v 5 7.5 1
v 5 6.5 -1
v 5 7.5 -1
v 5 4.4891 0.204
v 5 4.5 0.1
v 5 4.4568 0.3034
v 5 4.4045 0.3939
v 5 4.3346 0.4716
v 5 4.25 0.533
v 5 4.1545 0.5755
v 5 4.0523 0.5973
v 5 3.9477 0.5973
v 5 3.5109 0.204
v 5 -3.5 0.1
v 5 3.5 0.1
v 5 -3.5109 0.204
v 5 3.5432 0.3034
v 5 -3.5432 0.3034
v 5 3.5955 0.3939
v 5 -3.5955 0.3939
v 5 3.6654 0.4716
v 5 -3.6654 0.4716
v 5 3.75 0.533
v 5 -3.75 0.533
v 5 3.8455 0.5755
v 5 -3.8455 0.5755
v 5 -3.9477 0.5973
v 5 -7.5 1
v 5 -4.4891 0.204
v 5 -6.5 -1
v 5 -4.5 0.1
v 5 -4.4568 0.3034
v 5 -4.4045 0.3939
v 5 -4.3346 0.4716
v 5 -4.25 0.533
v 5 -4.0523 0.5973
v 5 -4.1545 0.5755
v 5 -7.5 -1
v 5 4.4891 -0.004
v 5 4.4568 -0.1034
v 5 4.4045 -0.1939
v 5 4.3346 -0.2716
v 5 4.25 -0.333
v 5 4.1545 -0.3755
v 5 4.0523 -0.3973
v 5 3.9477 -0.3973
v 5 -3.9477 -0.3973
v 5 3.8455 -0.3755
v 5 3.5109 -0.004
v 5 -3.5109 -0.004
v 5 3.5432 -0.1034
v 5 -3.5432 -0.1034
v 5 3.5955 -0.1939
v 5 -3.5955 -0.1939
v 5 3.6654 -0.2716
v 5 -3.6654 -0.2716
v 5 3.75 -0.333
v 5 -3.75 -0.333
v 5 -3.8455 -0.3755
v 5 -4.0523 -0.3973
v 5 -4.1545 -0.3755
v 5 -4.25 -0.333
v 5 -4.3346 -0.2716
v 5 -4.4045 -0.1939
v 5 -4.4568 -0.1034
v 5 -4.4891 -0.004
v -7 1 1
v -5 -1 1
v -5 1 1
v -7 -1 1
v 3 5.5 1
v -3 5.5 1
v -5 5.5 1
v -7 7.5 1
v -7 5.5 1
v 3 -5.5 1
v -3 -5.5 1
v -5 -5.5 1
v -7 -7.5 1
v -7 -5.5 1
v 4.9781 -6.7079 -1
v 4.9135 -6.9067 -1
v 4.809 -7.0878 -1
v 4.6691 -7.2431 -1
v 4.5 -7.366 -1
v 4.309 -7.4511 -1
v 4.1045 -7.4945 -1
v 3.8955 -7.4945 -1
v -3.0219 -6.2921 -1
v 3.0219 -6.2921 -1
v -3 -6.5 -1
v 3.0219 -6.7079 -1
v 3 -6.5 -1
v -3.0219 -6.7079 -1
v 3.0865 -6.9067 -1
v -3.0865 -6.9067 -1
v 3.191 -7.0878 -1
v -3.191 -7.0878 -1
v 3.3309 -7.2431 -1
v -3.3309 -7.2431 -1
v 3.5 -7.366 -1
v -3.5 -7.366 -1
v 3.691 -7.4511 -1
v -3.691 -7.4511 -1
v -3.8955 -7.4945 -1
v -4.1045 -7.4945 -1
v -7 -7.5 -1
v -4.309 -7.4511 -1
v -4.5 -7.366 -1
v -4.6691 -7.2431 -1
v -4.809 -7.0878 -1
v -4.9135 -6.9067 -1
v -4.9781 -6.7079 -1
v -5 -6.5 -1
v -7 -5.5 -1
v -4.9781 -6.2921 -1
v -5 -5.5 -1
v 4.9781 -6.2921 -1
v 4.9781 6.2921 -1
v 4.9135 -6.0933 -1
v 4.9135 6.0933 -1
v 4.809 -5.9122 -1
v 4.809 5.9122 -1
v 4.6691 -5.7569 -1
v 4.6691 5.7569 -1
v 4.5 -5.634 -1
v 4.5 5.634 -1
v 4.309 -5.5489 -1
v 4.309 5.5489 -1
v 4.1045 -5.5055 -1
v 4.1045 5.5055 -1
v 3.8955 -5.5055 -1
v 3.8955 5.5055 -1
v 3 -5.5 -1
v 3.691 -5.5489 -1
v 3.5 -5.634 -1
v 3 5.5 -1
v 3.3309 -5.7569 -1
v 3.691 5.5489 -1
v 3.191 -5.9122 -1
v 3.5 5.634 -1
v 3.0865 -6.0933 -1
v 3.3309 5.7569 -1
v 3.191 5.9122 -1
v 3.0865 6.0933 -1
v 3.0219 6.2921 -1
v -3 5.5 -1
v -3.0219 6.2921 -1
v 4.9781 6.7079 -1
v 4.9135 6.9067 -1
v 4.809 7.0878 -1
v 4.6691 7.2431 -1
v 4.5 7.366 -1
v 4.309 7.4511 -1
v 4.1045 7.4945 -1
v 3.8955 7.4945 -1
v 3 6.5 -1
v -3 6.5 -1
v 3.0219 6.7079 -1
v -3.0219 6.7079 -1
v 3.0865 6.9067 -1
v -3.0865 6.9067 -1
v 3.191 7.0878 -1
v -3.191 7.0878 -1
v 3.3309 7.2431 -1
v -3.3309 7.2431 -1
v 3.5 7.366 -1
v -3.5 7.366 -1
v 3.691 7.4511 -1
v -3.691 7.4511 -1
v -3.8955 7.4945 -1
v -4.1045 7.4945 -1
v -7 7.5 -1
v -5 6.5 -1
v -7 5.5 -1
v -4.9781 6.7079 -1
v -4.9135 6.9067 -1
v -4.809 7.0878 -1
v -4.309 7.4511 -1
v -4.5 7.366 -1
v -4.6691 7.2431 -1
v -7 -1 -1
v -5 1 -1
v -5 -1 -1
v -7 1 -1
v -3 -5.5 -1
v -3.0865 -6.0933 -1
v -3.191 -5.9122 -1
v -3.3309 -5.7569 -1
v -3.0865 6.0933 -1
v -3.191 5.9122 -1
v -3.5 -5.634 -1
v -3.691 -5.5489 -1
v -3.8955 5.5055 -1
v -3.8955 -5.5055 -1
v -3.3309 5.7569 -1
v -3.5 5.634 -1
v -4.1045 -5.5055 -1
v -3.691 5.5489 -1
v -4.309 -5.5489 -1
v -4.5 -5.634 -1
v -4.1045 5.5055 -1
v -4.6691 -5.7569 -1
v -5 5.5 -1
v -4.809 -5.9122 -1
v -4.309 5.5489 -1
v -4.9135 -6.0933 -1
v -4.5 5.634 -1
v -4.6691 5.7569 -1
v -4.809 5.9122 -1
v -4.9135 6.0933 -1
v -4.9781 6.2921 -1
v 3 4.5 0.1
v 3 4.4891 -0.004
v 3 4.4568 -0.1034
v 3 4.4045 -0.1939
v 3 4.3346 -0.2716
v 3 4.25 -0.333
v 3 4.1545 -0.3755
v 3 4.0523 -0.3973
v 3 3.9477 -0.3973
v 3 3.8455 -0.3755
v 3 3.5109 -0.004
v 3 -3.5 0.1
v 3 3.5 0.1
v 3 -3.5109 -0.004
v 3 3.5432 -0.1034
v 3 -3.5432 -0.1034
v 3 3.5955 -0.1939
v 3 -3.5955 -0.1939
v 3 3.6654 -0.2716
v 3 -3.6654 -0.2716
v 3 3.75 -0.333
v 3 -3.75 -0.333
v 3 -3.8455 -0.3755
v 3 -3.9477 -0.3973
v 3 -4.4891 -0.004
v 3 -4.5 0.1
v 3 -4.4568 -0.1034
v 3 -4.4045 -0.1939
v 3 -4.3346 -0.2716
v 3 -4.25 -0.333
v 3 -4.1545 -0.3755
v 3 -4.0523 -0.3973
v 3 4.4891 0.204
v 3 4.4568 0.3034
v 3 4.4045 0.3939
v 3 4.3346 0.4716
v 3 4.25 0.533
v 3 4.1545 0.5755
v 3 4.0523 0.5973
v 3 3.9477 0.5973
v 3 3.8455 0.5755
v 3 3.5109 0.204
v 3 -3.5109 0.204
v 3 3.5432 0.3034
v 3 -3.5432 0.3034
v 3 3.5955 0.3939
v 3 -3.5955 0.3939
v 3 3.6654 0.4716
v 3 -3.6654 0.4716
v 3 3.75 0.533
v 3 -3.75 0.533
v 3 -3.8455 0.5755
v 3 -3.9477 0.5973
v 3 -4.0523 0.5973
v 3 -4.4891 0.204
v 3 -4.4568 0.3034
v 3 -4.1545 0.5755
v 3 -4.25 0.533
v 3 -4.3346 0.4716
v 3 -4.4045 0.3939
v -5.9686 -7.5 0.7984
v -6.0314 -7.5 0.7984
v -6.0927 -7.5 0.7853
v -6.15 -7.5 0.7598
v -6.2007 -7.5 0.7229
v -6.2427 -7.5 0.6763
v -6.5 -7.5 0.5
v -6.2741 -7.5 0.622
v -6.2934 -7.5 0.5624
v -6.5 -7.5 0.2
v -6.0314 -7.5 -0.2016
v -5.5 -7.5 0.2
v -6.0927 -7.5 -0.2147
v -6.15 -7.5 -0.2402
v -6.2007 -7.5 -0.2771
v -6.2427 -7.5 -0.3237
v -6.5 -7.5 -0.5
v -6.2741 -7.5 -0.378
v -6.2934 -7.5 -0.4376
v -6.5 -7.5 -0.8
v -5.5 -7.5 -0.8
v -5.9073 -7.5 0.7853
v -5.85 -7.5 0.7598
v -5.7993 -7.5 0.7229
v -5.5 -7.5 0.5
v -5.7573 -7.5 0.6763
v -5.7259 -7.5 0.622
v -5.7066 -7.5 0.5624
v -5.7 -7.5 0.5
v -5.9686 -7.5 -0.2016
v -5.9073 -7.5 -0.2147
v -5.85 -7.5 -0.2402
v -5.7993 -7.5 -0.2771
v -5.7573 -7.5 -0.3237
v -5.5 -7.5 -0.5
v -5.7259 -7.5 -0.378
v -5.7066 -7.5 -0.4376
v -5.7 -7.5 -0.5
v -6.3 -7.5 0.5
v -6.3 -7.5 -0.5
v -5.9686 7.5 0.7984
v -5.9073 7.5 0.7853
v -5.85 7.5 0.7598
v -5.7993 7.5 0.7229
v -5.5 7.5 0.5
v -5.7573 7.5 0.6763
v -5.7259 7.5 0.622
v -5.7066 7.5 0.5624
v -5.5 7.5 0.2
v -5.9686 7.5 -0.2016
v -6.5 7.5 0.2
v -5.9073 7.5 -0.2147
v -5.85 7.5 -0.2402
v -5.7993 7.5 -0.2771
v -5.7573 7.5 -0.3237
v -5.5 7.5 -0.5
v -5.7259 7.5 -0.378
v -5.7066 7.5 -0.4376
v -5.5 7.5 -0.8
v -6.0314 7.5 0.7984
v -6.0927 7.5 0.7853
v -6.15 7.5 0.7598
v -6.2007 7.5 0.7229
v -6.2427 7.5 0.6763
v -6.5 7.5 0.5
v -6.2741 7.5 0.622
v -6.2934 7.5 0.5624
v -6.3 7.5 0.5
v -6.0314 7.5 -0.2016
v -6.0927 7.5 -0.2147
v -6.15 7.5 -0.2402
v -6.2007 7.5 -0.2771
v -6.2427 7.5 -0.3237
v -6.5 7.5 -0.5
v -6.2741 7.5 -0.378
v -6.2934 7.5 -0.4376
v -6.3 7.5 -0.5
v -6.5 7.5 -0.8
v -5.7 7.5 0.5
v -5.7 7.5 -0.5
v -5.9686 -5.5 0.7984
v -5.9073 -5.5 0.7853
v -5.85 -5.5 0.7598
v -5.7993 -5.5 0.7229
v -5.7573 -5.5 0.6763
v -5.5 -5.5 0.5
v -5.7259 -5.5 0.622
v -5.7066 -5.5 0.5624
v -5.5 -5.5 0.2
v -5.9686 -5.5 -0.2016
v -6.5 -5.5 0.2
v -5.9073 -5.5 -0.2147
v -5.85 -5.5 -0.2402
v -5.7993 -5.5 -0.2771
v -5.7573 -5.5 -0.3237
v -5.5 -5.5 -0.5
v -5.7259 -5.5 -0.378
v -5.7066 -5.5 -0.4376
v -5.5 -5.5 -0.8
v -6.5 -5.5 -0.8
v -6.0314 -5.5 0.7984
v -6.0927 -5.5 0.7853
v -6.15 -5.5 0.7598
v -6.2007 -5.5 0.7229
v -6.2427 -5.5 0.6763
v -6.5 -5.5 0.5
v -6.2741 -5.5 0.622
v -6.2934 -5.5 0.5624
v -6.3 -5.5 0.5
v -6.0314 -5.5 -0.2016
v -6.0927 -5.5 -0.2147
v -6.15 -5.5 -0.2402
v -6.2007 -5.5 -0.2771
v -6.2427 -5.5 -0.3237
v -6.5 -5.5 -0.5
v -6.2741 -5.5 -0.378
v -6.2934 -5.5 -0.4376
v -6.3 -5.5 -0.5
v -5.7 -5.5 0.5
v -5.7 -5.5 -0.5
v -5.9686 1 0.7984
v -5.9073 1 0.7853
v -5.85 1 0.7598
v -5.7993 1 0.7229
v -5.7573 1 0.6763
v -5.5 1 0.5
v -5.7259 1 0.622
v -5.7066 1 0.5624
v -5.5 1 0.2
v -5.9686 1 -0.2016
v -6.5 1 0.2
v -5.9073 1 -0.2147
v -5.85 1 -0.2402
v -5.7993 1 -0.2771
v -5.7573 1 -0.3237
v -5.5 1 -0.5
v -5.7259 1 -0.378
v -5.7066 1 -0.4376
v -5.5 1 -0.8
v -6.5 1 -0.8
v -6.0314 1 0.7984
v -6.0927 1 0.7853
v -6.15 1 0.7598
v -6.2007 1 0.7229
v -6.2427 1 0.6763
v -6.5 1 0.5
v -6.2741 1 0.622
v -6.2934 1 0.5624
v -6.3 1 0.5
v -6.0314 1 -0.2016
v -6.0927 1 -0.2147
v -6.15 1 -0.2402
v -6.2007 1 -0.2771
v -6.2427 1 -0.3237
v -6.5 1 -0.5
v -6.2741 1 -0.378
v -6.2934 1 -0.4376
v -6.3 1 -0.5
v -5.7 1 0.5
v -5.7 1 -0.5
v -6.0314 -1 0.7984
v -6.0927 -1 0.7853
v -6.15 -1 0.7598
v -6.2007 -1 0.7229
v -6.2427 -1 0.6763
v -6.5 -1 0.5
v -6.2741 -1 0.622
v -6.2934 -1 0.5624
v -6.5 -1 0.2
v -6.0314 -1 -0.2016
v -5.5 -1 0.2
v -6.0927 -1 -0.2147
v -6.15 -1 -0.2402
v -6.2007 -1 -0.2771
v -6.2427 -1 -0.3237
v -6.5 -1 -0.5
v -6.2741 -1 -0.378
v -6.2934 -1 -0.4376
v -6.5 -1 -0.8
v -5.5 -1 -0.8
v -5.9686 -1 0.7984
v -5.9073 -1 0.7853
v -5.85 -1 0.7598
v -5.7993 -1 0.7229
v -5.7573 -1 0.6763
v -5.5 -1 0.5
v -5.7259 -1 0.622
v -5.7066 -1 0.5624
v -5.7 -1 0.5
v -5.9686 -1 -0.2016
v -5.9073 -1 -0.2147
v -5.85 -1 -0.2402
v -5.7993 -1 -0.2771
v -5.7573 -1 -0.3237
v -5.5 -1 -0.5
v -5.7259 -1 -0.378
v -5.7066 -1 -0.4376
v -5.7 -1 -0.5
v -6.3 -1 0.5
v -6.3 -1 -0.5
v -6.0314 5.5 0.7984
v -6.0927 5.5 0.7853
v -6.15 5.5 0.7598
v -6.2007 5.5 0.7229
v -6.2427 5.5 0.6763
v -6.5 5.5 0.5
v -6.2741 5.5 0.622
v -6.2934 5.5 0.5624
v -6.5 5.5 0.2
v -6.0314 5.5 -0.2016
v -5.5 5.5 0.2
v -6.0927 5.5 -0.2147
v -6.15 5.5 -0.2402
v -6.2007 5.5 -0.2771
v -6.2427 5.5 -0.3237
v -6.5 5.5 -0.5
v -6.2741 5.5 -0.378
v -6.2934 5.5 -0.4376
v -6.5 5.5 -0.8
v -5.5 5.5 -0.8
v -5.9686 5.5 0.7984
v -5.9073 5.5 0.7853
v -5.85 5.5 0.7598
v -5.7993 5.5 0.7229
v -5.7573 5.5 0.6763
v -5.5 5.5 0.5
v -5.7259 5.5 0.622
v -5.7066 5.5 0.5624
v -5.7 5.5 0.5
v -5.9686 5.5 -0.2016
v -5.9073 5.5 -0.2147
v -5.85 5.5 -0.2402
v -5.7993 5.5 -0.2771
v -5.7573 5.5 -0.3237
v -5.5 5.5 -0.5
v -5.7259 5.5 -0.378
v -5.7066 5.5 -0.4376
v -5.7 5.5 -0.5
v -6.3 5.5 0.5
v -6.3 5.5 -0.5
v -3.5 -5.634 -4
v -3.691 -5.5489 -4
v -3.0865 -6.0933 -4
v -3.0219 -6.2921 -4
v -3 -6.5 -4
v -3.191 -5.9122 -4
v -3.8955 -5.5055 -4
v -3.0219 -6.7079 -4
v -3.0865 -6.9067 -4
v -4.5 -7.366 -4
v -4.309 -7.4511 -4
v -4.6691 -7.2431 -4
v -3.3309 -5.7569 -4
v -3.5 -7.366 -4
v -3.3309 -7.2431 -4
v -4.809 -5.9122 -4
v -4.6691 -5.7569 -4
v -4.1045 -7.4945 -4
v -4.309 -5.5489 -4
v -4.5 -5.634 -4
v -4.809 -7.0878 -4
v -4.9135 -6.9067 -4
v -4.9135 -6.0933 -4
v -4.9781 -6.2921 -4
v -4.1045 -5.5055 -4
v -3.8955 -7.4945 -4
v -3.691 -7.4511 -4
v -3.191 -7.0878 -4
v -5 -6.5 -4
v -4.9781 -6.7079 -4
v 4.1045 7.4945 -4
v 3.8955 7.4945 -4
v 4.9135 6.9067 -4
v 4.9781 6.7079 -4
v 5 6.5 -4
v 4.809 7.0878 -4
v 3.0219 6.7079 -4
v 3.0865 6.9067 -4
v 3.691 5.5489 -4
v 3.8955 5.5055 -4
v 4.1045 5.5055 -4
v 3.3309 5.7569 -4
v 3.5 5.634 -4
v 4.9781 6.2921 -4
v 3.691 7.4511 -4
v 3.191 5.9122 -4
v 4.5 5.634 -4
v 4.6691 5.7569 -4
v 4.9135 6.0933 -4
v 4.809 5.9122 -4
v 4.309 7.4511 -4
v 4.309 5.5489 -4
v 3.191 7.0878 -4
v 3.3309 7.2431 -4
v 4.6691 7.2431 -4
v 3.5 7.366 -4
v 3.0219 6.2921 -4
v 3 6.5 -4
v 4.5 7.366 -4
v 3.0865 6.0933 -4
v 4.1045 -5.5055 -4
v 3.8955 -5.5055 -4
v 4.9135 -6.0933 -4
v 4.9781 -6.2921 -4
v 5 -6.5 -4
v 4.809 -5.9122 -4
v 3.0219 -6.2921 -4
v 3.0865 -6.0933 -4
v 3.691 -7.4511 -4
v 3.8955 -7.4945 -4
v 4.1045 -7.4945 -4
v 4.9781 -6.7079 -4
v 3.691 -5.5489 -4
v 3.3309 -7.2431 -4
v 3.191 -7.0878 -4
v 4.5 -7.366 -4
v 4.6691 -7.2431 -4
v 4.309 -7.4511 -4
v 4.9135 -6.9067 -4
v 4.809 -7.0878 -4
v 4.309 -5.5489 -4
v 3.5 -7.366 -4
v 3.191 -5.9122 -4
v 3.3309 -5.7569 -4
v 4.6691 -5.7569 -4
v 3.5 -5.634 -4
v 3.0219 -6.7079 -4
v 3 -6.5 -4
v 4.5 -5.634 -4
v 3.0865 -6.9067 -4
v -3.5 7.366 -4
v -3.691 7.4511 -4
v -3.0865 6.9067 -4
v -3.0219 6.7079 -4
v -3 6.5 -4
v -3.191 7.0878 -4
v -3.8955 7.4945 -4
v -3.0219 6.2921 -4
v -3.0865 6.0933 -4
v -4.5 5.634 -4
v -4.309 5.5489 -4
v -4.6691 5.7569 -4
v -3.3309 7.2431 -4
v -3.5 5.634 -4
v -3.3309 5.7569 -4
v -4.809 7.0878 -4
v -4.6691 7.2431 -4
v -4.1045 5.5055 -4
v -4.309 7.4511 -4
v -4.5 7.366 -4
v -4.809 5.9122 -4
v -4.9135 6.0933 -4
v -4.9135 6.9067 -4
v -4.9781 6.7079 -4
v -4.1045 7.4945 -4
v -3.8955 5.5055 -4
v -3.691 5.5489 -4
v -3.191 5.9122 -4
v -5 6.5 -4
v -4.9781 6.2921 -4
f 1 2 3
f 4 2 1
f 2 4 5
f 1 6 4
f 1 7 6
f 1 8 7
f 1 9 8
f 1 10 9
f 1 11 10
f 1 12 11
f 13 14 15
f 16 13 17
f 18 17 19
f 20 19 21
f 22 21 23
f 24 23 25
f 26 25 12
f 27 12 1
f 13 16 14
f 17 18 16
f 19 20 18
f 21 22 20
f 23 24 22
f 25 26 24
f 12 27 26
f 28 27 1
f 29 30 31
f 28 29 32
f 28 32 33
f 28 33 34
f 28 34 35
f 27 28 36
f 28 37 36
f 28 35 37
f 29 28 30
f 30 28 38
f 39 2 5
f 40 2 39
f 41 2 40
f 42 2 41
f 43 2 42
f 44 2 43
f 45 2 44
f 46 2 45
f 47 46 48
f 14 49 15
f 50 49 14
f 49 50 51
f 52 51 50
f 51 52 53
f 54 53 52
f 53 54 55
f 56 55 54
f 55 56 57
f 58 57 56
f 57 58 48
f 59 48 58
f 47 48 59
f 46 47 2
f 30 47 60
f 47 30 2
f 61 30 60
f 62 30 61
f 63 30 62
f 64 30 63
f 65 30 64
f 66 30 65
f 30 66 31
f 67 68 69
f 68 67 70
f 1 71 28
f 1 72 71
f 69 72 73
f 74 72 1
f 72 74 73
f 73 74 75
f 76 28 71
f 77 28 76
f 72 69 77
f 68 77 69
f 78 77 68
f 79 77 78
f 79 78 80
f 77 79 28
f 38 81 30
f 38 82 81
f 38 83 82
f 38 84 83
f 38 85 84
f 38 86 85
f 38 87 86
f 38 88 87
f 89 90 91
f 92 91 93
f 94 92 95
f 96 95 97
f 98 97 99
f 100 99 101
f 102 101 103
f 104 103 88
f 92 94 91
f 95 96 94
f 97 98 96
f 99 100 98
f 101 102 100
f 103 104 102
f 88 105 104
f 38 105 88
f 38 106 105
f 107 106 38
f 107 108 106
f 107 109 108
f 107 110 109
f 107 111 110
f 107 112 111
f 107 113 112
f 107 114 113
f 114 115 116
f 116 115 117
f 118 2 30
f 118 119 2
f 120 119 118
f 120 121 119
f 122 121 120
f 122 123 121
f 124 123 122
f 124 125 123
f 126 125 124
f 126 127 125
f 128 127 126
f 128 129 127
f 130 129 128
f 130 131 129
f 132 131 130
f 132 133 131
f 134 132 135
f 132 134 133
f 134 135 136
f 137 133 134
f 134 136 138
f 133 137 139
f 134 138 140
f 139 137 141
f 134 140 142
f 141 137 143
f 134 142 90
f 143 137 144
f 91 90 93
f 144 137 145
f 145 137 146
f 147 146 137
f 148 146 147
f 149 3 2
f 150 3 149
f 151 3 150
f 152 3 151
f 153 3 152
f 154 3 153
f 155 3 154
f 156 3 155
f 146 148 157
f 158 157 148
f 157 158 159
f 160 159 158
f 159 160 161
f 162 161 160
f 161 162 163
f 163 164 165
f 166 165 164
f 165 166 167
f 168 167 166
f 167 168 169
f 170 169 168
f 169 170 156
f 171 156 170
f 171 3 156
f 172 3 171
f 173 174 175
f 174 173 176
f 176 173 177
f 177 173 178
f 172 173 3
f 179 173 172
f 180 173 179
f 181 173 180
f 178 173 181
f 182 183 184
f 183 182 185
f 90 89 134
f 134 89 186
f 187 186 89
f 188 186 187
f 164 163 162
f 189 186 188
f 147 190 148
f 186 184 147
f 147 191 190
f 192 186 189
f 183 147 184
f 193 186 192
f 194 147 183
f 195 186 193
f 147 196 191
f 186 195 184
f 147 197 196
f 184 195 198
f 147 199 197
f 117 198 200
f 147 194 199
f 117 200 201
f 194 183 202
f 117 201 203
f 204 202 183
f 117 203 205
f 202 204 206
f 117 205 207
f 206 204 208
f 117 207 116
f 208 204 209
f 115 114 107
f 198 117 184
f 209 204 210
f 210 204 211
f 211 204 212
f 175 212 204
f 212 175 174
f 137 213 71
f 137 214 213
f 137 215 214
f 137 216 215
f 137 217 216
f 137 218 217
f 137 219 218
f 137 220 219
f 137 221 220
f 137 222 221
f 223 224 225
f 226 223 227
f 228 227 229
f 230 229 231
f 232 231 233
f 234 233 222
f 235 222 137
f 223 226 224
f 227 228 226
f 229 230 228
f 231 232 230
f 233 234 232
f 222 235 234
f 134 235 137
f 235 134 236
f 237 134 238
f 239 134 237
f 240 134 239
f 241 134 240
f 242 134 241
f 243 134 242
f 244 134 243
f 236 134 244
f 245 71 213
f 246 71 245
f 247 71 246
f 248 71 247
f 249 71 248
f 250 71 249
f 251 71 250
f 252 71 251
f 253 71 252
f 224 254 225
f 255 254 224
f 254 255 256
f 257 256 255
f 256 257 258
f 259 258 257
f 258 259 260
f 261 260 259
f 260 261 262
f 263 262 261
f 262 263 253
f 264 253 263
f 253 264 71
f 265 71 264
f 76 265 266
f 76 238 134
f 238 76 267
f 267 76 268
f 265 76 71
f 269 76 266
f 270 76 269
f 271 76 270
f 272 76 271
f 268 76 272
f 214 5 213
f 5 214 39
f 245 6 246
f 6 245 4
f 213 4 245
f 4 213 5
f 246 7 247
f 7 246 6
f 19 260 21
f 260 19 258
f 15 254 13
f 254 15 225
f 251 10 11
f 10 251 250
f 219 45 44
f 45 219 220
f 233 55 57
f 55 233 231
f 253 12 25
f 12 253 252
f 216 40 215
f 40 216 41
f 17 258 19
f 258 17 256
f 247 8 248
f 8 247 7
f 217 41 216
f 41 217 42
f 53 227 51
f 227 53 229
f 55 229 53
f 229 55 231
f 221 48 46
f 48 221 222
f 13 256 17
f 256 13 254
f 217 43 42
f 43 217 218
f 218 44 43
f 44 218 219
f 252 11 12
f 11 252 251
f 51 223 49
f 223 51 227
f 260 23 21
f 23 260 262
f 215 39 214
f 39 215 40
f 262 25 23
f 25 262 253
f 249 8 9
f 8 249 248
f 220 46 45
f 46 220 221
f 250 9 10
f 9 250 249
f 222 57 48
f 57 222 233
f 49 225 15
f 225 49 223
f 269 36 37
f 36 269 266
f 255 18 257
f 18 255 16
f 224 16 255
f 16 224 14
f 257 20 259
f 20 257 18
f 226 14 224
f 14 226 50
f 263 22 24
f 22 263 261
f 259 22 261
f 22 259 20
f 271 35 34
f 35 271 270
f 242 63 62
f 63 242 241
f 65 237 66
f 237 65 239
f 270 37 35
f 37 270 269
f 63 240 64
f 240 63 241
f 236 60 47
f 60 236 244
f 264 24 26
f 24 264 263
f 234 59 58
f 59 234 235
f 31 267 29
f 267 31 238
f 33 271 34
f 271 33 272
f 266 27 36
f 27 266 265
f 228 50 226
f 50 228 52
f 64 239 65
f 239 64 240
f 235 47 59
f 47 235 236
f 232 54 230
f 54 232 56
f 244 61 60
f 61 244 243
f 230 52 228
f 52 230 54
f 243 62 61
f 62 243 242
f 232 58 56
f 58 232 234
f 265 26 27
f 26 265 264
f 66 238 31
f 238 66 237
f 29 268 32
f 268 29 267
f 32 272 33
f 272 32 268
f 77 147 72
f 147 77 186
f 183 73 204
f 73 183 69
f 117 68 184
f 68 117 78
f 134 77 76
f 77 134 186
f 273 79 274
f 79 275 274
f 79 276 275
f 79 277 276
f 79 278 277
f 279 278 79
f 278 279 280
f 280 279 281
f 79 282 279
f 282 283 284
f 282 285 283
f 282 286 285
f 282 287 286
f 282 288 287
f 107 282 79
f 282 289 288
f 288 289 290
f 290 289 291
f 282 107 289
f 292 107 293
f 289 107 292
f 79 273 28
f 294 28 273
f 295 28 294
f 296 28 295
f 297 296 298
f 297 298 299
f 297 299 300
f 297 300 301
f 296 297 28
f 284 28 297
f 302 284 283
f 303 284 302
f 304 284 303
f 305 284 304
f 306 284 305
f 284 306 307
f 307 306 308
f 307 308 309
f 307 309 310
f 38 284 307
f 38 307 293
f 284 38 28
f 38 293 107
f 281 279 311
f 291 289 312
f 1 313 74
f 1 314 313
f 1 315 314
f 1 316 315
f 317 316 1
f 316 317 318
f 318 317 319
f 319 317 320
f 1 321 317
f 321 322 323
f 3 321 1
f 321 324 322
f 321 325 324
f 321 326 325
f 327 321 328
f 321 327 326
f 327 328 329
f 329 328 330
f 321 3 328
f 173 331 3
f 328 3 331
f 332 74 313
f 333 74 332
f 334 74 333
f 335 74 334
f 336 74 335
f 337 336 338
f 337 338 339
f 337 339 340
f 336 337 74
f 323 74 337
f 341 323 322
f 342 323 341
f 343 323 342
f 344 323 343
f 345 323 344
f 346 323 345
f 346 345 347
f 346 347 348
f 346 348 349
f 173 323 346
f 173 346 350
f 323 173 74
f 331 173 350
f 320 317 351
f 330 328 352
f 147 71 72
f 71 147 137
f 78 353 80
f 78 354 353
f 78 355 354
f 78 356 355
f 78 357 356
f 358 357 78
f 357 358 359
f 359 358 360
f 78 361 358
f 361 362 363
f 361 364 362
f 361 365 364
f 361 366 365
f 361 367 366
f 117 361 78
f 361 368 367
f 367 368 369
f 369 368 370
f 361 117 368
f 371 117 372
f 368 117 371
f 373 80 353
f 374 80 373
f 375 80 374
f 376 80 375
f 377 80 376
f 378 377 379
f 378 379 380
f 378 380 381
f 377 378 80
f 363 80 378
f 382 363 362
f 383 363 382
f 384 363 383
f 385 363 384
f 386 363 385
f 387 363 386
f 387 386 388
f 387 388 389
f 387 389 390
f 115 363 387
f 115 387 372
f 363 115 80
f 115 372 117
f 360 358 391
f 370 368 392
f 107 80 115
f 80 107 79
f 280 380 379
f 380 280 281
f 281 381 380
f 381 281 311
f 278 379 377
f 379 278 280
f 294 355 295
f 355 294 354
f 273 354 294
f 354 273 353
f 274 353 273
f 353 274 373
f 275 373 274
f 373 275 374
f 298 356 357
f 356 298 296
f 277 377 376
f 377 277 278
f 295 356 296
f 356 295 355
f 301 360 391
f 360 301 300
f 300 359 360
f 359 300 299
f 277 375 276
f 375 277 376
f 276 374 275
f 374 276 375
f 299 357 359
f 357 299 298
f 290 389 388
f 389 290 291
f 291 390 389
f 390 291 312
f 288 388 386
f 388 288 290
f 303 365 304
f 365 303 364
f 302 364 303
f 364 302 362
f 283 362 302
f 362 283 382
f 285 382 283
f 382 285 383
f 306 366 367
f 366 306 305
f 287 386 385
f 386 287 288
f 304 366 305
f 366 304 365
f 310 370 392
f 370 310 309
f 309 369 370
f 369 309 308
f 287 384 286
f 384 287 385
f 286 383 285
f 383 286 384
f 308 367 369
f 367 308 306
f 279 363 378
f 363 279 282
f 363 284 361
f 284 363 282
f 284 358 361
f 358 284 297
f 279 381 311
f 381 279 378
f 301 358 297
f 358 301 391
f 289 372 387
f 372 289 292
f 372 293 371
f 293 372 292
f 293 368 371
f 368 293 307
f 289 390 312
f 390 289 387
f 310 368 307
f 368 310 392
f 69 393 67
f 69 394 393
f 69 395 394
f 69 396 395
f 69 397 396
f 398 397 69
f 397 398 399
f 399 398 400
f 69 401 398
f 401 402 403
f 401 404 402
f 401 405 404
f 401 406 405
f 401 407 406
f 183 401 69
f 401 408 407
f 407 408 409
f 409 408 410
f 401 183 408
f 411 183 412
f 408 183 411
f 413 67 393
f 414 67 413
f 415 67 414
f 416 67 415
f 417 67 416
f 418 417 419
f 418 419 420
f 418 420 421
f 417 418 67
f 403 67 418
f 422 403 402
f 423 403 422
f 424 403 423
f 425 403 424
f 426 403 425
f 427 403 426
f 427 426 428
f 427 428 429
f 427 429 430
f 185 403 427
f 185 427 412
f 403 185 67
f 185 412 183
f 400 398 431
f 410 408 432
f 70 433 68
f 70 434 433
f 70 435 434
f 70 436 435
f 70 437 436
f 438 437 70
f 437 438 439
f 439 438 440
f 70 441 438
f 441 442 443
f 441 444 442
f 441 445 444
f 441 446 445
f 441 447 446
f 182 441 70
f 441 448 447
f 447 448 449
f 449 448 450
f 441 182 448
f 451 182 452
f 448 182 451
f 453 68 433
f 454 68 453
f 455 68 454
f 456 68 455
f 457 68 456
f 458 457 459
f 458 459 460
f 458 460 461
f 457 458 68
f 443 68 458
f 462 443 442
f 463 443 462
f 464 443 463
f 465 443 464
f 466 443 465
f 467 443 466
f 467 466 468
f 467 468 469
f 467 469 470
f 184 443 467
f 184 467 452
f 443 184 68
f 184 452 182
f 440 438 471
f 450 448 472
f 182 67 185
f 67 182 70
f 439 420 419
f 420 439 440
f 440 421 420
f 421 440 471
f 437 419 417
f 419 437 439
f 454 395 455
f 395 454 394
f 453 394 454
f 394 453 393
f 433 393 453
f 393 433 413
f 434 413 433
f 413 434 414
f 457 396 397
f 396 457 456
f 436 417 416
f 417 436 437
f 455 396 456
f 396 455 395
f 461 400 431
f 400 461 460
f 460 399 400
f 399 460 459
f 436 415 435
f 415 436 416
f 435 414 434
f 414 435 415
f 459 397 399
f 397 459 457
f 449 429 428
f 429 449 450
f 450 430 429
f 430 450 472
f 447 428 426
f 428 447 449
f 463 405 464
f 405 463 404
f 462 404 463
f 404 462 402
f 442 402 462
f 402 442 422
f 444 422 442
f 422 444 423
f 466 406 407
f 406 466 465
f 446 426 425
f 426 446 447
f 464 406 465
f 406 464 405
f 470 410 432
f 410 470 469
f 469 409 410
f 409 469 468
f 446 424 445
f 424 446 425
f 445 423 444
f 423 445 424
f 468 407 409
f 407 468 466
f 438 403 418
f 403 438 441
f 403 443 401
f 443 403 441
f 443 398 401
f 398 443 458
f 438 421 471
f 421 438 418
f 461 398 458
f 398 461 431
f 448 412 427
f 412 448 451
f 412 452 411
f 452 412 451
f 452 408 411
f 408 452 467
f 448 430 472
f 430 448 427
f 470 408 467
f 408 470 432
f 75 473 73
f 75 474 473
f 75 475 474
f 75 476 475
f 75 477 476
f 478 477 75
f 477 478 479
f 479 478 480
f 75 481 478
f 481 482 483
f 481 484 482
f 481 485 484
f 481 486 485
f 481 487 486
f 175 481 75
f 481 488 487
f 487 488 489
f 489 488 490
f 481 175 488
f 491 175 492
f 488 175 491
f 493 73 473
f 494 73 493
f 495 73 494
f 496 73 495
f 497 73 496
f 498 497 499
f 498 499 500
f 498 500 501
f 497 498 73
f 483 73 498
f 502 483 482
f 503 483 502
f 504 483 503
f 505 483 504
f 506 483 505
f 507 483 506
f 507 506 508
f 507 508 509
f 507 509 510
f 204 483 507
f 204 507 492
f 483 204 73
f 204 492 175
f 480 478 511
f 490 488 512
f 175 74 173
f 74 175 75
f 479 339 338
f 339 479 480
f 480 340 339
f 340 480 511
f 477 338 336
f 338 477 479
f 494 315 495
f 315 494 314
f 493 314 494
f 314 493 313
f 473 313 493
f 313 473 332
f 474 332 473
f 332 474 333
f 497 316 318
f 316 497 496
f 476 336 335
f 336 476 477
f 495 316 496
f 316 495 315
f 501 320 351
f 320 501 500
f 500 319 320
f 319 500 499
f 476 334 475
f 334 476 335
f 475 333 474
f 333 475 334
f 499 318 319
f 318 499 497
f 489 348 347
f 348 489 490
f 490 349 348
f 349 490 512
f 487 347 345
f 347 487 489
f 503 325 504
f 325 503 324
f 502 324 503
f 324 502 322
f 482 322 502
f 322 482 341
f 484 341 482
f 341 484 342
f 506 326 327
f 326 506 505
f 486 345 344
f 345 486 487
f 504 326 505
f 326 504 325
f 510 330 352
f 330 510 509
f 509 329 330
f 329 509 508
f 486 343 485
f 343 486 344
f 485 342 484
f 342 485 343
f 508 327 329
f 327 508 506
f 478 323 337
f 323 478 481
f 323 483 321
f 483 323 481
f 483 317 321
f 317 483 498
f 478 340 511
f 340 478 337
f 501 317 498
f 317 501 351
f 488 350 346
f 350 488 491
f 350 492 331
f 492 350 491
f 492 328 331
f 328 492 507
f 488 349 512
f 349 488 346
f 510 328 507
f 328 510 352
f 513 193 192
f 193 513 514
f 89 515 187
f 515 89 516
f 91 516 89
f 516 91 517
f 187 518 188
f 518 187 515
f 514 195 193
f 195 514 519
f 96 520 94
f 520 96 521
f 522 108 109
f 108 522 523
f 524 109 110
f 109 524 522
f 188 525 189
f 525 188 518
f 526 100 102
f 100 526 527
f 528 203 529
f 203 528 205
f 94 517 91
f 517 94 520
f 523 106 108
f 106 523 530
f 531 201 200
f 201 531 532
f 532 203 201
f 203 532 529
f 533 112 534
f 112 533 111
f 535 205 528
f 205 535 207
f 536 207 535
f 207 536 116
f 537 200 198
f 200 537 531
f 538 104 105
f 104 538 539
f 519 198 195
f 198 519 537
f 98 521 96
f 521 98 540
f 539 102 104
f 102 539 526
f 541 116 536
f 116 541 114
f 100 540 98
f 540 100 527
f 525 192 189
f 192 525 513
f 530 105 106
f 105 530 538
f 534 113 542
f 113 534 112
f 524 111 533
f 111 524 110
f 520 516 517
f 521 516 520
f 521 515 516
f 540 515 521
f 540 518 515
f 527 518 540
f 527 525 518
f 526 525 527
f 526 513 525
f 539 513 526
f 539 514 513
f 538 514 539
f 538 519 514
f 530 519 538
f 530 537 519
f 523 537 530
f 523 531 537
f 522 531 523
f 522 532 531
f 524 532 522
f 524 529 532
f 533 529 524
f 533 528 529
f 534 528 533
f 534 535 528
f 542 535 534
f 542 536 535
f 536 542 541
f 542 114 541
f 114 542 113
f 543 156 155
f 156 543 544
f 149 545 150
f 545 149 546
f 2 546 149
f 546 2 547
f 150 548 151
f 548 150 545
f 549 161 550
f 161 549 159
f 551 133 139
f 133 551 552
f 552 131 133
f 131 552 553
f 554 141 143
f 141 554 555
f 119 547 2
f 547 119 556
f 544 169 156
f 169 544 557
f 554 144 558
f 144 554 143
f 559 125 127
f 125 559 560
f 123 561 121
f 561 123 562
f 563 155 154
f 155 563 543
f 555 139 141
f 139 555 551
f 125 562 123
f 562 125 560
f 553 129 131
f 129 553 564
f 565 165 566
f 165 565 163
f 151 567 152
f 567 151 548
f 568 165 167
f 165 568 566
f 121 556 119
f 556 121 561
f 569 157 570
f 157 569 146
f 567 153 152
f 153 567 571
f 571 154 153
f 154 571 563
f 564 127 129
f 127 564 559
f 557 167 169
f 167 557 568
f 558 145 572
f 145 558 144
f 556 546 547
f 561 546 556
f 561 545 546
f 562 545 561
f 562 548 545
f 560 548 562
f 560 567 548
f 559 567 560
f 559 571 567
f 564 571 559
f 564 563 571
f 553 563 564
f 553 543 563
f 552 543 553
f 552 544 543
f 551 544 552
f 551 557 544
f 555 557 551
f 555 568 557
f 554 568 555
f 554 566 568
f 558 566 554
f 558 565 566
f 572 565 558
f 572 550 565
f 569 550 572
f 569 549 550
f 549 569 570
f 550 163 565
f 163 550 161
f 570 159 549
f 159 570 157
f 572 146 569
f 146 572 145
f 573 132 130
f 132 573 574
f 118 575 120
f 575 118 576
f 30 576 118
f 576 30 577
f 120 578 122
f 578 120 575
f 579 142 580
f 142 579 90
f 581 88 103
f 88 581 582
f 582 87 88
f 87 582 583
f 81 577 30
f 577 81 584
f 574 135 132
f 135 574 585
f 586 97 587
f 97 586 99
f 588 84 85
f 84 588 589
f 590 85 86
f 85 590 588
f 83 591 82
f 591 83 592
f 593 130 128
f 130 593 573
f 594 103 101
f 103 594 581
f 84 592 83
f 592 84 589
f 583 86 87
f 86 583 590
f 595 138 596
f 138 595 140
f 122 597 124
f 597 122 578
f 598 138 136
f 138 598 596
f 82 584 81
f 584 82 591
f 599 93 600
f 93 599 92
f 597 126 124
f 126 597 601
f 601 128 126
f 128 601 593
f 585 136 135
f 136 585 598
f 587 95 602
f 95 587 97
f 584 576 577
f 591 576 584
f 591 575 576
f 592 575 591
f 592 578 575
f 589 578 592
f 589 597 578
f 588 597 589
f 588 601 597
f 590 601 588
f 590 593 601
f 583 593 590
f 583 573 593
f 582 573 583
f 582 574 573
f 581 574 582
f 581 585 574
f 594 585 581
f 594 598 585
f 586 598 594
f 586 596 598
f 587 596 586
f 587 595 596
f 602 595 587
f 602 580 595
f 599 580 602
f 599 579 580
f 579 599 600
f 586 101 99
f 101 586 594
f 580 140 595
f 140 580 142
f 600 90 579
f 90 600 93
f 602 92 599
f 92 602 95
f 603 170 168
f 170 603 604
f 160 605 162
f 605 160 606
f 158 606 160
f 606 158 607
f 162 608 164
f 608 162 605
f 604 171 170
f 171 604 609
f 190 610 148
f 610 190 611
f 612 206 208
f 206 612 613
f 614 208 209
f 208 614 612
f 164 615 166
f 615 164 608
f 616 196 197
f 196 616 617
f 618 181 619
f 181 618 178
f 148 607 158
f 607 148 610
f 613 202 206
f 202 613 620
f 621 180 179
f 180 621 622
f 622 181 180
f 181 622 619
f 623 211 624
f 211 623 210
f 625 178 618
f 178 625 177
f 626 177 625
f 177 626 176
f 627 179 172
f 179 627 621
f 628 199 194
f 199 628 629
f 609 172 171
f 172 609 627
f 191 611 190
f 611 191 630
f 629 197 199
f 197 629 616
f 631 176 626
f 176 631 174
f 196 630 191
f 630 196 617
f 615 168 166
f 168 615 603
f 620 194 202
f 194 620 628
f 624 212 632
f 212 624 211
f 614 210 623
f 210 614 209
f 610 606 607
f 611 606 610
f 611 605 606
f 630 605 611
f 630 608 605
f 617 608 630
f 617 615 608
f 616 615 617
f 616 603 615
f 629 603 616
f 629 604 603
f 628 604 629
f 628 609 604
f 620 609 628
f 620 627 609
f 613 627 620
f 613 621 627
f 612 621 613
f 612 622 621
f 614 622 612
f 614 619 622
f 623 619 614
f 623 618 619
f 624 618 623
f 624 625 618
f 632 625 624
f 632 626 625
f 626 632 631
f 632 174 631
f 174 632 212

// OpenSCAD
//embout pour connecter au cadre du milieu(sur le côté droite) avec trois cube(sur le côté gauche) 
//End piece to connect the middle (right side) 3 cubes (left side)
//côté droite longeur avec deux trou extrême droite et droite
//right side with 2 holes far right and right
union () 					{
difference()	{
translate([4,0,0]) {
cube(size=[2,13,2],center=true);
						 }
rotate(a=120,v=[1,1,1])translate([4,0.1,3])cylinder(r=0.5,h=3);
				
rotate(a=120,v=[1,1,1])translate([-4,0.1,3])cylinder(r=0.5,h=3);			
	}
//côté gauche longeur
//left side length 
translate([-4,0,0]){								
cube(size=[2,13,2], center=true);
		}		

//largeur (vers l'avant)
//widht (towards the front)
translate([0,-6.5,0]){
cube(size=[10,2,2],center=true);
		}

// largeur (vers l'arrière)
//widht (back)
translate([0,6.5,0]){
cube(size=[10,2,2],center=true);
		}

								}

// Jambe gauche
// left leg
$fn=30;
translate([-4,-6.5,-4]){
cylinder(h=3,l=10);
		}

//Jambe extrême droite
// far right leg
$fn=30;
translate([4,6.5,-4]){
cylinder(h=3,l=10);
		}

//Jambe droite
//right leg
$fn=30;
translate([4,-6.5,-4]){
cylinder(h=3,l=10);
		}

// Jambe extrême gauche
//far left leg 
$fn=30;
translate([-4,6.5,-4]){
cylinder(h=3,l=10);
		}

// Cube (gauche) avec trou(en haut et en bas) pour faire entre les clés 
// left cube with hole (top and bottom) to fit in sticks
union()											{
rotate (a=450,v=[0,0,1])translate([2.5,20,0])					{
translate([-10,-15,-1]){
difference () 					{
cube(size=[2,2,2]);
rotate(a=120,v=[1,1,1])translate([1,1.5,-0.5])cylinder(r=0.3,h=3);	
rotate(a=120,v=[1,1,1])translate([1,0.5,-0.5])cylinder(r=0.3,h=3);
rotate(a=270,v=[5,0,0])translate([-1.5,-1.5,0.5])cube(size=[3.5,0.3,1.0]);
rotate(a=270,v=[5,0,0])translate([-1,-0.5,0.5])cube(size=[3.1,0.3,1.0]);
						}
				
									}


															       }	

// Cube (gauche milieu) avec trou (en haut et en bas) pour faire entre les clés
// left middle cube with hole (top and bottom) to fit in sticks
rotate (a=450,v=[0,0,1])translate([-9,22,0])					{	
translate([8,-17,-1]){
difference () 					   {
cube(size=[2,2,2]);
rotate(a=120,v=[1,1,1])translate([1,1.5,-0.5])cylinder(r=0.3,h=3);	
rotate(a=120,v=[1,1,1])translate([1,0.5,-0.5])cylinder(r=0.3,h=3);
rotate(a=270,v=[5,0,0])translate([-1.5,-1.5,0.5])cube(size=[3.5,0.3,1.0]);
rotate(a=270,v=[5,0,0])translate([-1,-0.5,0.5])cube(size=[3.1,0.3,1.0]);
						}
				
									}					
																}


//Cube (gauche extrême) avec un trou (en haut et en bas) pour faire entre les clés 
//Cube far left with hole (top and bottom) to fit in sticks
rotate (a=450,v=[0,0,1])translate([-2.5,-10,0])			{	
translate([8,15,-1]){
difference () 				       {
cube(size=[2,2,2]);
rotate(a=120,v=[1,1,1])translate([1,1.5,-0.5])cylinder(r=0.3,h=3);	
rotate(a=120,v=[1,1,1])translate([1,0.5,-0.5])cylinder(r=0.3,h=3);
rotate(a=270,v=[5,0,0])translate([-1.5,-1.5,0.5])cube(size=[3.5,0.3,1.0]);
rotate(a=270,v=[5,0,0])translate([-1,-0.5,0.5])cube(size=[3.1,0.3,1.0]);
					}
				
									}	 					 }

						
				
									
						
												}
									


															       
						

														
